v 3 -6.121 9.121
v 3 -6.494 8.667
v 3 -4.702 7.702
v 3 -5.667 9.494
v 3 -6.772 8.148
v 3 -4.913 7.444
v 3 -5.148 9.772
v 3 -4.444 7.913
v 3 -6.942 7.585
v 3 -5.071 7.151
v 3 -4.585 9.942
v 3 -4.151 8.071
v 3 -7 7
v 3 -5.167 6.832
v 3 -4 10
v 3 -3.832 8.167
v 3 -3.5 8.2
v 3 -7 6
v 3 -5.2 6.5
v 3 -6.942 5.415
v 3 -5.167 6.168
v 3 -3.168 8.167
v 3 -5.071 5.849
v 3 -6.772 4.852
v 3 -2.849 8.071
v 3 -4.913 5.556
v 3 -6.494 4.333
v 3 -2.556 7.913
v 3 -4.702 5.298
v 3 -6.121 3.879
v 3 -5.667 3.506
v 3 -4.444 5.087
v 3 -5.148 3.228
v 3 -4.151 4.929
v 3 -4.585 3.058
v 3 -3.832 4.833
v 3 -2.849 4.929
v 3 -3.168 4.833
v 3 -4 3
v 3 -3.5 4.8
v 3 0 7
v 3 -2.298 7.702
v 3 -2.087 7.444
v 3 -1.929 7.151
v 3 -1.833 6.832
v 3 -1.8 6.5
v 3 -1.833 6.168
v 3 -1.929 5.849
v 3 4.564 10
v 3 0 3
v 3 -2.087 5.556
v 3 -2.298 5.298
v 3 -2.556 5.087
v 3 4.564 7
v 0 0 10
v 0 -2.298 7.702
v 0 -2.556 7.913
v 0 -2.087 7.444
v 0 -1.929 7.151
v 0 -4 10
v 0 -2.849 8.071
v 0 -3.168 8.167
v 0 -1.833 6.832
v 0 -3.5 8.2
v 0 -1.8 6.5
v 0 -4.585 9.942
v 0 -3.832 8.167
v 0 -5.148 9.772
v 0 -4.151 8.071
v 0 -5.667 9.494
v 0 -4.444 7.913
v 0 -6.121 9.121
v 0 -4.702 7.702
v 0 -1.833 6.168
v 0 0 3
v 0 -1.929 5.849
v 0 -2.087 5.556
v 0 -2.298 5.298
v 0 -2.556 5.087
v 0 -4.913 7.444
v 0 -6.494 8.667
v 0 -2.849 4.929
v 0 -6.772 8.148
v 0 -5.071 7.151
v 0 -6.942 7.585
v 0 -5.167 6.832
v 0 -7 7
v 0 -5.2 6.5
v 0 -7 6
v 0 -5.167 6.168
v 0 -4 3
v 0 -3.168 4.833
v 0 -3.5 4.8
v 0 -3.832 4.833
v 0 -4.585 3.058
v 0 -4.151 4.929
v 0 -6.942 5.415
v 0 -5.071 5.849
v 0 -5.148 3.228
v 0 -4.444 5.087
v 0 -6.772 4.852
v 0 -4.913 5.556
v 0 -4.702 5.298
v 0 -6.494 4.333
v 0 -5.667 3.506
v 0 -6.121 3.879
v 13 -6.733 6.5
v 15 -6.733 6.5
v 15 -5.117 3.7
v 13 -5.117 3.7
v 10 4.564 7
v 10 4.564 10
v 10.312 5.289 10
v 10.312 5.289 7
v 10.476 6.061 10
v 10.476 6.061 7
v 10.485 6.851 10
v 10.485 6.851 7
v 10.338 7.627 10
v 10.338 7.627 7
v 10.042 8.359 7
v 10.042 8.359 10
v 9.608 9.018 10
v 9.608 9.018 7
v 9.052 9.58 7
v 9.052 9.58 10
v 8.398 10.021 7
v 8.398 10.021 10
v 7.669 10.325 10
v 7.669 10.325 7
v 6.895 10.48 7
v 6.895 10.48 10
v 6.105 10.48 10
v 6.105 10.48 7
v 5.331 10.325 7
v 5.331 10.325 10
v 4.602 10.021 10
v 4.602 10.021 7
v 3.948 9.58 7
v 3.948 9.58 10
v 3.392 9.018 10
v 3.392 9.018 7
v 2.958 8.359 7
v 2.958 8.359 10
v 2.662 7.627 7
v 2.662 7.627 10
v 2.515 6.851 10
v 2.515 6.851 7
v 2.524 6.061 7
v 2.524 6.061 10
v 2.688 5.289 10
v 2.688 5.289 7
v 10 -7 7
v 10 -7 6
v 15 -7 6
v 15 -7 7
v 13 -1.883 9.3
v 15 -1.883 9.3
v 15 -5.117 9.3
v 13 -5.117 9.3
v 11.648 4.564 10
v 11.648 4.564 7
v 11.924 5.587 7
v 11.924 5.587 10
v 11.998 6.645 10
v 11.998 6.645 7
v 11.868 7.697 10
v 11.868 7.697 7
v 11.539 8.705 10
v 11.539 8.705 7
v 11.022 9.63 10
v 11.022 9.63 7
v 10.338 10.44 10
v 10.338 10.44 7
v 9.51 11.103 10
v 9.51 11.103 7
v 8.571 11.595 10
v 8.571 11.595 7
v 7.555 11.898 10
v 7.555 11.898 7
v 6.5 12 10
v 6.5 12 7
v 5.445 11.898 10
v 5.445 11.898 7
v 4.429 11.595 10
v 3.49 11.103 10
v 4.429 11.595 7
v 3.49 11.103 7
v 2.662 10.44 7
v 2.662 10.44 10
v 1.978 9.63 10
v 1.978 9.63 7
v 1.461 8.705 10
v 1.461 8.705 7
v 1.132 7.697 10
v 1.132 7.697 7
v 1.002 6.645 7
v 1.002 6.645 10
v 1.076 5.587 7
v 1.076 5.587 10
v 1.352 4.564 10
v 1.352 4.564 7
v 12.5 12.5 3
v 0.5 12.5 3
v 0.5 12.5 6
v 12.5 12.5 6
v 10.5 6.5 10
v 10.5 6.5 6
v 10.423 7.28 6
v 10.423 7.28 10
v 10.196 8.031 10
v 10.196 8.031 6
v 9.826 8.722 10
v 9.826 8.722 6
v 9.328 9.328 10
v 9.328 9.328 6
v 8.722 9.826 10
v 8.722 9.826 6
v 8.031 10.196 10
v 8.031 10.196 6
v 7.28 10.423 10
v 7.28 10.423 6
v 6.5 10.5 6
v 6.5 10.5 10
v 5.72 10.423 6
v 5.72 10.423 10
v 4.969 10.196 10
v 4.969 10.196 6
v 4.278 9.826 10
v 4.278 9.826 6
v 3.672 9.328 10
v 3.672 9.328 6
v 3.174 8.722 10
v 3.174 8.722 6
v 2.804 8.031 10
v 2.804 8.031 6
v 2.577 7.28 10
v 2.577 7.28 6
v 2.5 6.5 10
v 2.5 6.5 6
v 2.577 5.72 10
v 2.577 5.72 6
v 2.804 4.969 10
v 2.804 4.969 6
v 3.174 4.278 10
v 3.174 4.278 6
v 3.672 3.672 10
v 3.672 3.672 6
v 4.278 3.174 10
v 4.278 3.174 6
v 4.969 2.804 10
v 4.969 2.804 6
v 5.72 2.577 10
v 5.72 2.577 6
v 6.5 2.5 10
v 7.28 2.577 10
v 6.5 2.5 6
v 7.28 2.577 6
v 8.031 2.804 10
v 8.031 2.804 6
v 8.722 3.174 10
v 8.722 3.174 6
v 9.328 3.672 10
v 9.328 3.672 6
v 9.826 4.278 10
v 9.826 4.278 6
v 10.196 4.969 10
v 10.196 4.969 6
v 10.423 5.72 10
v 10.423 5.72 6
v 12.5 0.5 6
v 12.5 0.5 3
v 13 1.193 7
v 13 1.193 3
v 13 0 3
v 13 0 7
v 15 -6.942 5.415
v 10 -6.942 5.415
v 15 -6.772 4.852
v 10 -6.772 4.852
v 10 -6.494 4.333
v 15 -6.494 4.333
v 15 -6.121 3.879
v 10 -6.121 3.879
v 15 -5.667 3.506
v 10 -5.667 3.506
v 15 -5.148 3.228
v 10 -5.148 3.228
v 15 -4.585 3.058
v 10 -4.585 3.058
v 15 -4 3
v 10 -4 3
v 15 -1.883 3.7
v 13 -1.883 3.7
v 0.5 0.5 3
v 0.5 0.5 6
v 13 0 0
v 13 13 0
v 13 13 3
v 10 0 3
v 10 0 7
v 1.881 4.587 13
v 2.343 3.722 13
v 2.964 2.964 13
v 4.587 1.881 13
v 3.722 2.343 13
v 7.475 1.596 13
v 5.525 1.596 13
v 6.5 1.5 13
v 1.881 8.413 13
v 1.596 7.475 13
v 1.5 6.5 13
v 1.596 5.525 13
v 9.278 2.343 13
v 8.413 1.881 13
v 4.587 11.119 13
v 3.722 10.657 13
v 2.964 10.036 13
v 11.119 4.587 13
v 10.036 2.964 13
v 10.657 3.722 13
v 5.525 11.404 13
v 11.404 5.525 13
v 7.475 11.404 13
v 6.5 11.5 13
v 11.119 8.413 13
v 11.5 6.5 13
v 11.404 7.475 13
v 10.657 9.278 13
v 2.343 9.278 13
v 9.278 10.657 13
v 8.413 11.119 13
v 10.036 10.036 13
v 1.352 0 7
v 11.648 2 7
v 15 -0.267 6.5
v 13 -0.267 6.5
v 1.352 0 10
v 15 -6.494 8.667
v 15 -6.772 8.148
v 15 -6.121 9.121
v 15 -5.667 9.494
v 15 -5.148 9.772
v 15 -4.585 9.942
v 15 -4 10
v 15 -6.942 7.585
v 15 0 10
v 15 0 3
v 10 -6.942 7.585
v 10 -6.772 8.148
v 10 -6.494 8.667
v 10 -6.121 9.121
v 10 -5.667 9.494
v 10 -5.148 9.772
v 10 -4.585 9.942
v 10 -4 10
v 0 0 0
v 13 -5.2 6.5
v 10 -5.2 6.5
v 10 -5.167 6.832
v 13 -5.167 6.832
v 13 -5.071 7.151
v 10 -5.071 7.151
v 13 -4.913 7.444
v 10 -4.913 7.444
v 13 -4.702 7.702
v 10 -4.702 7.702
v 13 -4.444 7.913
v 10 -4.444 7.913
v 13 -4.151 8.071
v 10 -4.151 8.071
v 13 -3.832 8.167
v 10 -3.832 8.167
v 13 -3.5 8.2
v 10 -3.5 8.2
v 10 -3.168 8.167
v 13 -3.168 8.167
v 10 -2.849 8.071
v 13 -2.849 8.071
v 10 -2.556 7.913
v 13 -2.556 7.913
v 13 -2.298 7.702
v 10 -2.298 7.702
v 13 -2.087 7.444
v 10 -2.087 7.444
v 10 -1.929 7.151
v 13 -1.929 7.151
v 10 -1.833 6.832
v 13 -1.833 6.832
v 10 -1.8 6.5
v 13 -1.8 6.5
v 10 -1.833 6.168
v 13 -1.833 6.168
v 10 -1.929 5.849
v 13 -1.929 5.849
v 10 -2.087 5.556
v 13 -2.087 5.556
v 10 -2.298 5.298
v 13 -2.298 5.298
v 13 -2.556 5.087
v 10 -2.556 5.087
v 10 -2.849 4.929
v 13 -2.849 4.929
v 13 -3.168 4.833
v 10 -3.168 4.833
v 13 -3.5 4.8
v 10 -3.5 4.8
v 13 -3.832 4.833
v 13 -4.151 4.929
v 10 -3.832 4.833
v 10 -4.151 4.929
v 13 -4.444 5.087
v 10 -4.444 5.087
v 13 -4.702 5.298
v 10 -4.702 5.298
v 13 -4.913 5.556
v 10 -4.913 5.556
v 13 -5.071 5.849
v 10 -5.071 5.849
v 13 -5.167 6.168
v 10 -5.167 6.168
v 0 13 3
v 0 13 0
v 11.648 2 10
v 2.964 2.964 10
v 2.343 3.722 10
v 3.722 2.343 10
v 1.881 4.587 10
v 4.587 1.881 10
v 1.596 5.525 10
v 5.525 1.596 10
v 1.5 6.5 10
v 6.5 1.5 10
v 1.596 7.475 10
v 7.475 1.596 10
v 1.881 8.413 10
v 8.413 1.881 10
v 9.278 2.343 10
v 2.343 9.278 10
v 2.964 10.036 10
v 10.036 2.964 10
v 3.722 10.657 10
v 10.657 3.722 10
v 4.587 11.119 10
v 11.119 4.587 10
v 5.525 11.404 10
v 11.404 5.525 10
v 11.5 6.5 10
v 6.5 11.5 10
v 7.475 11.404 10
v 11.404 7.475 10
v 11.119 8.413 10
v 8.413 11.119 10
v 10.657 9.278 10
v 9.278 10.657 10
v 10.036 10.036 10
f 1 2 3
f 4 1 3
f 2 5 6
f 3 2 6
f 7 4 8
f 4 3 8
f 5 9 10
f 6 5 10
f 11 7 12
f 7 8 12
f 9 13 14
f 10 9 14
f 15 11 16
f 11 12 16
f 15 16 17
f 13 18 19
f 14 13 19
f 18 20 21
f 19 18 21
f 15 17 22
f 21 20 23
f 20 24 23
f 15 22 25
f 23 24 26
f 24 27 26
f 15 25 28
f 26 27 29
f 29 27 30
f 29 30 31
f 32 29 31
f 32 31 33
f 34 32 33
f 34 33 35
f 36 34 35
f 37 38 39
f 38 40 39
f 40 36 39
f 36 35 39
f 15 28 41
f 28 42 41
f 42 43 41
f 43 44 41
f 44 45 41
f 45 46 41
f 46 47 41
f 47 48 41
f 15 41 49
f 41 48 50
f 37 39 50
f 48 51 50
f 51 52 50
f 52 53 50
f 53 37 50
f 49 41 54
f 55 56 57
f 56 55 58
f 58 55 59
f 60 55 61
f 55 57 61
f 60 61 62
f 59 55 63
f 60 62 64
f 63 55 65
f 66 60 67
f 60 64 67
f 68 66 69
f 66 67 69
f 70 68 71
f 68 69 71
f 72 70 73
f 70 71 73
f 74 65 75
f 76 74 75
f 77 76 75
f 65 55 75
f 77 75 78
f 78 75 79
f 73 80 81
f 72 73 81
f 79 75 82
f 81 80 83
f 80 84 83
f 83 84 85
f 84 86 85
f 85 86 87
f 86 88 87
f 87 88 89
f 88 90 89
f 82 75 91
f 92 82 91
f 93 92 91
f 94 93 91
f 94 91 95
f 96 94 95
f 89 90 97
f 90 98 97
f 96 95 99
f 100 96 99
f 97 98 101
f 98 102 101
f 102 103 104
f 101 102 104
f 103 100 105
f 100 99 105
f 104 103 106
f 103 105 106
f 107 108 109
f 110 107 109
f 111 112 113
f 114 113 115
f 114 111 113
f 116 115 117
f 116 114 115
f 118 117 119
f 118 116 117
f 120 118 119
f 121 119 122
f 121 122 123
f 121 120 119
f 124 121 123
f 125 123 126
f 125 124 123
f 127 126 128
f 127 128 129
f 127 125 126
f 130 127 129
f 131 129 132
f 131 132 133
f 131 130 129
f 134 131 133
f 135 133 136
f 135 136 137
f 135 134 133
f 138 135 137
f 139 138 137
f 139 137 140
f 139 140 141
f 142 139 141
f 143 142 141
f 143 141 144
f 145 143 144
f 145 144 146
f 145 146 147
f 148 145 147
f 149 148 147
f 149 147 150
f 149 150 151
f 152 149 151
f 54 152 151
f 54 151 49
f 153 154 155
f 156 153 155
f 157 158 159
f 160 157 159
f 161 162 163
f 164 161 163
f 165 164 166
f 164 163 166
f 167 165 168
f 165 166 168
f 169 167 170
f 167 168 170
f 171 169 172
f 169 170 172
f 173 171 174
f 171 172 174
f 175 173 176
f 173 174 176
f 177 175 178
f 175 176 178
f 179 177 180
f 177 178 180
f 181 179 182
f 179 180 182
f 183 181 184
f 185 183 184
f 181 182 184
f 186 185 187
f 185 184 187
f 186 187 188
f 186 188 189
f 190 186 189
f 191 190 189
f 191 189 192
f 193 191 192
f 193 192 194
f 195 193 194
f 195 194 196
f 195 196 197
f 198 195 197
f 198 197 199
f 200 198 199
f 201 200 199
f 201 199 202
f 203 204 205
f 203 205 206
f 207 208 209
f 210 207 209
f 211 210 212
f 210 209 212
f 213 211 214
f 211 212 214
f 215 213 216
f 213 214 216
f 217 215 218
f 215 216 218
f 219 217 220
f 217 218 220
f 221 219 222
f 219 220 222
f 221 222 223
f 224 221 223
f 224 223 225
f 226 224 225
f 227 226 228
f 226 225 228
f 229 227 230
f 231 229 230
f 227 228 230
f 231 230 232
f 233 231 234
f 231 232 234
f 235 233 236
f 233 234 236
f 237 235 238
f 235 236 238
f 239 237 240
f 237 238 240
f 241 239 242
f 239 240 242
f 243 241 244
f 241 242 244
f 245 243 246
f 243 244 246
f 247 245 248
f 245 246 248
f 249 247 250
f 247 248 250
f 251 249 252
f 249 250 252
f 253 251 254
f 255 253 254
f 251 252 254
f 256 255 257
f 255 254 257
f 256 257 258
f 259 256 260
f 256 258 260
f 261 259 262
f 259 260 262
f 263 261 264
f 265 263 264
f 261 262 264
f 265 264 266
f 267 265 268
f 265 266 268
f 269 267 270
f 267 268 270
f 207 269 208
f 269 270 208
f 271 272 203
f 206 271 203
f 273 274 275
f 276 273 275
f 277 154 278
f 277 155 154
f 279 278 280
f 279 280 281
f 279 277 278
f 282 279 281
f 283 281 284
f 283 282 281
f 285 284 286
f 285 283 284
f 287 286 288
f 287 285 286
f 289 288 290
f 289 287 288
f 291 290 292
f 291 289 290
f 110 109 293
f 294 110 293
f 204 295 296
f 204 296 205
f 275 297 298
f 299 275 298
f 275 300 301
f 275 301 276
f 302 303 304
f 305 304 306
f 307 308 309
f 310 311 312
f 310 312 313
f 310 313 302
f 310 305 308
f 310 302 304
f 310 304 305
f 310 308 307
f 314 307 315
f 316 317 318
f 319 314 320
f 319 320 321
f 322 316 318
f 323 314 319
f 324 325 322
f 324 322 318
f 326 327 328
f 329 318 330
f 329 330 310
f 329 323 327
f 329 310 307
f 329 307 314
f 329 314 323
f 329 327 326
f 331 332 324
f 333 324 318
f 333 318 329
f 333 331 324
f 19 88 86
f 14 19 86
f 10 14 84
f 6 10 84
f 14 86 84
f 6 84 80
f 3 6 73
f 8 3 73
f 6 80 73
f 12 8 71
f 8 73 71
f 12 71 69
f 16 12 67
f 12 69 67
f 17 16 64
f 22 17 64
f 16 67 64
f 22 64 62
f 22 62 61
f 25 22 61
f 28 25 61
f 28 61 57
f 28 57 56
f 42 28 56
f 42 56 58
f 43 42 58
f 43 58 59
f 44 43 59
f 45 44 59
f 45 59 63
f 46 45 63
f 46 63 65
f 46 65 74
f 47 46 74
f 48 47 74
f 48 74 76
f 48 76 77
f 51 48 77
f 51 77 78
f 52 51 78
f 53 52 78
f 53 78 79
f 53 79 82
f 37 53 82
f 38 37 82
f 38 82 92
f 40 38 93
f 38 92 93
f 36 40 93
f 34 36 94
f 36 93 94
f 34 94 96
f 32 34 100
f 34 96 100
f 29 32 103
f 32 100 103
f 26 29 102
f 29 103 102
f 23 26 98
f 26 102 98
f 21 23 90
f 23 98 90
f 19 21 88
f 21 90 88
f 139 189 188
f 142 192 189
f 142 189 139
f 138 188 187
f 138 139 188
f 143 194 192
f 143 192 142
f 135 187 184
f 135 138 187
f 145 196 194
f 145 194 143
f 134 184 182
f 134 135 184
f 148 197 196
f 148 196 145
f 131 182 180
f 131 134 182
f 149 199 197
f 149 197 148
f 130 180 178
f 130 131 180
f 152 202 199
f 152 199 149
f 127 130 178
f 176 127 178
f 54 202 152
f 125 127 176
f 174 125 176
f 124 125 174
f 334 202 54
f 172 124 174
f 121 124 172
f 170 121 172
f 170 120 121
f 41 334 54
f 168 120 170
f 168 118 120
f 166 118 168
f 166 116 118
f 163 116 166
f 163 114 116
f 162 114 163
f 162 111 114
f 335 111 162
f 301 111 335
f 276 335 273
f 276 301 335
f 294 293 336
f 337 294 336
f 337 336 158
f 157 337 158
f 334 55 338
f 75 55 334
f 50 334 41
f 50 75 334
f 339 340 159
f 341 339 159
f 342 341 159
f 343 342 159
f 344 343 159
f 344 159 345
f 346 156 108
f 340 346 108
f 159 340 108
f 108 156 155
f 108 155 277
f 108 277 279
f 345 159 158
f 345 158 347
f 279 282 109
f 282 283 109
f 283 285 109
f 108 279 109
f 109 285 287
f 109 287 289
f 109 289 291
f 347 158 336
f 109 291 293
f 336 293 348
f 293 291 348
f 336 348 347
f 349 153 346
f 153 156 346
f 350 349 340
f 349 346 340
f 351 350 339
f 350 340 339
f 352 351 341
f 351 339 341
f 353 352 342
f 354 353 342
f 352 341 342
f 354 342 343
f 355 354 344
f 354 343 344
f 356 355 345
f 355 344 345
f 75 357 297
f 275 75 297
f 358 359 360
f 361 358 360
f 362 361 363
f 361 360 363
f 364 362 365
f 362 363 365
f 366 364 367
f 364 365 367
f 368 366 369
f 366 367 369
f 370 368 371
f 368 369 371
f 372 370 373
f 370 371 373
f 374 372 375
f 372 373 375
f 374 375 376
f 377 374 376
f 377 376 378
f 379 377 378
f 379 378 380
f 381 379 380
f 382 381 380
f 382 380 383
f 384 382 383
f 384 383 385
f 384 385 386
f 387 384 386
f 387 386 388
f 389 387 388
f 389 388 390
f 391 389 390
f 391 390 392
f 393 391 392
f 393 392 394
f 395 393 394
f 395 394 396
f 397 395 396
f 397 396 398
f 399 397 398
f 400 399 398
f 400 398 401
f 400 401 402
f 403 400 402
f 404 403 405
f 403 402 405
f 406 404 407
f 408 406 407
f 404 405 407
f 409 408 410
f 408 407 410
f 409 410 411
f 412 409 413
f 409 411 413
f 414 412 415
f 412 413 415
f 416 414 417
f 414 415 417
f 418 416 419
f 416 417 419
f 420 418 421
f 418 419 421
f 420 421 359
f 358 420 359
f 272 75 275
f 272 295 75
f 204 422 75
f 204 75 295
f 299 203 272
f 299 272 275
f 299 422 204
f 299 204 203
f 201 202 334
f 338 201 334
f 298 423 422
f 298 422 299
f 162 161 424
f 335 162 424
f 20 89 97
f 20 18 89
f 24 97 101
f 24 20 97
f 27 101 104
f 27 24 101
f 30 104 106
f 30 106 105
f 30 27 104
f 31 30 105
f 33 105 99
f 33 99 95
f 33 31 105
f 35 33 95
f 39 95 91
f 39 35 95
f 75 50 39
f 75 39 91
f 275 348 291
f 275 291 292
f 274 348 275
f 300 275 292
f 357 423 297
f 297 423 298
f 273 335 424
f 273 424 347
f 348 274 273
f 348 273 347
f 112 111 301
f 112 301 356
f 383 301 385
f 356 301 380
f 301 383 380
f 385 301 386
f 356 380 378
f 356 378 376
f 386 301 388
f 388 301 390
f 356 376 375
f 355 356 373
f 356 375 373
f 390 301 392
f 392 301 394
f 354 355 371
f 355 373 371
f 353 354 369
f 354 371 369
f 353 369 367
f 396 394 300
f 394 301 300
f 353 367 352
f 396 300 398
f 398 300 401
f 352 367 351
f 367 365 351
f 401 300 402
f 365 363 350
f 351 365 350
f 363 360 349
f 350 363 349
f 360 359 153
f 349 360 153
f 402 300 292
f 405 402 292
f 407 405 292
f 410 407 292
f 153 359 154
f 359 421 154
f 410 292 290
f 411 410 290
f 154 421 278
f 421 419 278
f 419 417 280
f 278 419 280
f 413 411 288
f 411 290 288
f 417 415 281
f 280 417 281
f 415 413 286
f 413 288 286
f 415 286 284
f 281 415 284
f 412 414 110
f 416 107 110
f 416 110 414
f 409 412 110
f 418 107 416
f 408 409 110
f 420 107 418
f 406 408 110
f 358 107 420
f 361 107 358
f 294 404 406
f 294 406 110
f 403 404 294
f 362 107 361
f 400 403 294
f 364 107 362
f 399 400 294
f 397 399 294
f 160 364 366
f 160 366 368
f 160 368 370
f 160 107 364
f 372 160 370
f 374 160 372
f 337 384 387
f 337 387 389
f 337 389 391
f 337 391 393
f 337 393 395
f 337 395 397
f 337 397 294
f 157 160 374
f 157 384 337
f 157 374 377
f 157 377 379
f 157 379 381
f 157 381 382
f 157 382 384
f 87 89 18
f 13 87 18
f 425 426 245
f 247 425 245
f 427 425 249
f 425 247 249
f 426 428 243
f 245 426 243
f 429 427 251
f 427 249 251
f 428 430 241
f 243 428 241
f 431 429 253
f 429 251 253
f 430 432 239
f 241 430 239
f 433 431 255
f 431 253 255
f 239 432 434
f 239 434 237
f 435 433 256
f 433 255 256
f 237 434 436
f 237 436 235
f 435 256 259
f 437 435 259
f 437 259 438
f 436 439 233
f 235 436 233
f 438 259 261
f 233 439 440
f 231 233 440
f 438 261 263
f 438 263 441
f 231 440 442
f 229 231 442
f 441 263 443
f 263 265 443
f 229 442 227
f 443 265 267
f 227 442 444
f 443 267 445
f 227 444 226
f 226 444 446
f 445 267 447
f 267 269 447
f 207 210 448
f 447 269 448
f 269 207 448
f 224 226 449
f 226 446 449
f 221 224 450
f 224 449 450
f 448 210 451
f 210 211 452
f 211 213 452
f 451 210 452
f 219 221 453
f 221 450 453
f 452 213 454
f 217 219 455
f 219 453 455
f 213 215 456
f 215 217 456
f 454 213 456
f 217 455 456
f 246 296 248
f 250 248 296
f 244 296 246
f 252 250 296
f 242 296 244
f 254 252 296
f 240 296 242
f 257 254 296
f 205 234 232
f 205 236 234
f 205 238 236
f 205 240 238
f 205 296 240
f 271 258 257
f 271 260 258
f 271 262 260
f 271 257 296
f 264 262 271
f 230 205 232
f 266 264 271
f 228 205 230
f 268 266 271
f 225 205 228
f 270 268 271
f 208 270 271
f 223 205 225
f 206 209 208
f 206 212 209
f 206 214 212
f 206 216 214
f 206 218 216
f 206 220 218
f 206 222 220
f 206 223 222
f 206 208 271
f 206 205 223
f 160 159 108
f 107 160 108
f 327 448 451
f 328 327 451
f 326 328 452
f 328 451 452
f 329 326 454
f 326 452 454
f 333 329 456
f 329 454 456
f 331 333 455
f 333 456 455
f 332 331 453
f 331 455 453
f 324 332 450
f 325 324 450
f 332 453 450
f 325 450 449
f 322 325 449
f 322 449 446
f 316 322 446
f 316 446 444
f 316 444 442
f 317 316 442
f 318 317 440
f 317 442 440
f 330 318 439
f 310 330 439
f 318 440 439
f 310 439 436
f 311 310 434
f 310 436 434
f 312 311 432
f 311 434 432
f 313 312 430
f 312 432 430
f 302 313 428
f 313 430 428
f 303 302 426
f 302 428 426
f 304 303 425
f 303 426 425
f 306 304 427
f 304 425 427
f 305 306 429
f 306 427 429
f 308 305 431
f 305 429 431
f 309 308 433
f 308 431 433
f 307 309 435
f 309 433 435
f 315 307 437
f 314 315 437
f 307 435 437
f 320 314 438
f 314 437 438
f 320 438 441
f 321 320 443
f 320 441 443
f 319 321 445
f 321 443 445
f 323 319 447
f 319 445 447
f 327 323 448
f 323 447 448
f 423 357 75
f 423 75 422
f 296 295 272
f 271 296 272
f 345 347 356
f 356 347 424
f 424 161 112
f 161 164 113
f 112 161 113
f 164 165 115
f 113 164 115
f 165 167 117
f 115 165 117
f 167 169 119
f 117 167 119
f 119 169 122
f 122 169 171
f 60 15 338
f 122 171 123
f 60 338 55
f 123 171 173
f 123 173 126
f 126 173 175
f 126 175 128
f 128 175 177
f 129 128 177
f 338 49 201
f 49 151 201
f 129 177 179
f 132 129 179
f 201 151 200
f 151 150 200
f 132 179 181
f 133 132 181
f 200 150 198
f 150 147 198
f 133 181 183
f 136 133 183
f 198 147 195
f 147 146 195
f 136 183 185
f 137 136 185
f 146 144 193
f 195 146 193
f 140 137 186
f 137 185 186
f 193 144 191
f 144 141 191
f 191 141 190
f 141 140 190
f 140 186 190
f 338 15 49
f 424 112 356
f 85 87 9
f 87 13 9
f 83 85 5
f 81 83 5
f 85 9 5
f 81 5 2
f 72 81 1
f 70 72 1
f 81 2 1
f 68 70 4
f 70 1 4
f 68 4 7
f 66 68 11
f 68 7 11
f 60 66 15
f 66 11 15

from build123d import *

# Parameters (mm, degrees)
BOX_W           = 13
BOX_H           = 13
BOX_DEPTH       = 3
SKETCH_W        = 12
SKETCH_H        = 12
PAD_DEPTH       = 3
SKETCH001_R     = 4
PAD001_DEPTH    = 4
SKETCH002_R     = 5
PAD002_DEPTH    = 3
PAD003_DEPTH    = 7
SKETCH004_R     = 1.7
POCKET_DEPTH    = 20
POCKET001_DEPTH = 2
SKETCH006_W     = 13
SKETCH006_H     = 13
POCKET002_DEPTH = 4
FILLET_R        = 3


with BuildPart() as camera:
    # Box → Box (new body)
    with BuildSketch(Plane.XY):
        with Locations((6.5, 6.5)):
            Rectangle(BOX_W, BOX_H)
    extrude(amount=BOX_DEPTH)

    # Sketch → Pad (new body)
    with BuildSketch(Plane.XY.offset(3)):
        with Locations((6.5, 6.5)):
            Rectangle(SKETCH_W, SKETCH_H)
    extrude(amount=PAD_DEPTH)

    # Sketch001 → Pad001 (new body)
    with BuildSketch(Plane.XY.offset(6)):
        with Locations((6.5, 6.5)):
            Circle(SKETCH001_R)
    extrude(amount=PAD001_DEPTH)

    # Sketch002 → Pad002 (new body)
    with BuildSketch(Plane.XY.offset(10)):
        with Locations((6.5, 6.5)):
            Circle(SKETCH002_R)
    extrude(amount=PAD002_DEPTH)


with BuildPart() as fillet_body:
    # Sketch003 → Pad003 (new body)
    with BuildSketch(Plane.XY.offset(3)):
        with BuildLine():
            ThreePointArc((10, 4.563508), (6.5, 10.5), (3, 4.563508))
            Line((3, -7), (3, 4.563508))
            Line((0, -7), (3, -7))
            Line((0, 0), (0, -7))
            Line((0, 0), (1.352185, 0))
            Line((1.352185, 4.563508), (1.352185, 0))
            ThreePointArc((11.647815, 4.563508), (6.5, 12), (1.352185, 4.563508))
            Line((11.647815, 4.563508), (11.647815, 2))
            Line((11.647815, 2), (15, 0))
            Line((15, -7), (15, 0))
            Line((10, -7), (15, -7))
            Line((10, 4.563508), (10, -7))
        make_face()
    extrude(amount=PAD003_DEPTH)

    # Sketch004 → Pocket (cut)
    with BuildSketch(Plane(origin=(0, 0, 3), x_dir=(0, -1, 0), z_dir=(-1, 0, 0))):
        with Locations((3.5, 3.5)):
            Circle(SKETCH004_R)
    extrude(amount=-POCKET_DEPTH, mode=Mode.SUBTRACT)

    # Sketch005 → Pocket001 (cut)
    with BuildSketch(Plane(origin=(15, 0, 3), x_dir=(0, 1, 0), z_dir=(1, 0, 0))):
        Polygon((-5.116581, 6.3), (-6.733162, 3.5), (-5.116581, 0.7), (-1.883419, 0.7), (-0.266838, 3.5), (-1.883419, 6.3), align=None)
    extrude(amount=-POCKET001_DEPTH, mode=Mode.SUBTRACT)

    # Sketch006 → Pocket002 (cut)
    with BuildSketch(Plane(origin=(0, 0, 3), x_dir=(1, 0, 0), z_dir=(0, 0, -1))):
        with Locations((6.5, -6.5)):
            Rectangle(SKETCH006_W, SKETCH006_H)
    extrude(amount=-POCKET002_DEPTH, mode=Mode.SUBTRACT)

    # Fillet
    fillet_edges = [fillet_body.edges().sort_by_distance(p)[0] for p in [
        (12.5, -7, 3),
        (12.5, -7, 10),
        (1.5, -7, 10),
        (1.5, -7, 3),
    ]]
    fillet(fillet_edges, radius=FILLET_R)


solid = Compound([camera.part, fillet_body.part])
